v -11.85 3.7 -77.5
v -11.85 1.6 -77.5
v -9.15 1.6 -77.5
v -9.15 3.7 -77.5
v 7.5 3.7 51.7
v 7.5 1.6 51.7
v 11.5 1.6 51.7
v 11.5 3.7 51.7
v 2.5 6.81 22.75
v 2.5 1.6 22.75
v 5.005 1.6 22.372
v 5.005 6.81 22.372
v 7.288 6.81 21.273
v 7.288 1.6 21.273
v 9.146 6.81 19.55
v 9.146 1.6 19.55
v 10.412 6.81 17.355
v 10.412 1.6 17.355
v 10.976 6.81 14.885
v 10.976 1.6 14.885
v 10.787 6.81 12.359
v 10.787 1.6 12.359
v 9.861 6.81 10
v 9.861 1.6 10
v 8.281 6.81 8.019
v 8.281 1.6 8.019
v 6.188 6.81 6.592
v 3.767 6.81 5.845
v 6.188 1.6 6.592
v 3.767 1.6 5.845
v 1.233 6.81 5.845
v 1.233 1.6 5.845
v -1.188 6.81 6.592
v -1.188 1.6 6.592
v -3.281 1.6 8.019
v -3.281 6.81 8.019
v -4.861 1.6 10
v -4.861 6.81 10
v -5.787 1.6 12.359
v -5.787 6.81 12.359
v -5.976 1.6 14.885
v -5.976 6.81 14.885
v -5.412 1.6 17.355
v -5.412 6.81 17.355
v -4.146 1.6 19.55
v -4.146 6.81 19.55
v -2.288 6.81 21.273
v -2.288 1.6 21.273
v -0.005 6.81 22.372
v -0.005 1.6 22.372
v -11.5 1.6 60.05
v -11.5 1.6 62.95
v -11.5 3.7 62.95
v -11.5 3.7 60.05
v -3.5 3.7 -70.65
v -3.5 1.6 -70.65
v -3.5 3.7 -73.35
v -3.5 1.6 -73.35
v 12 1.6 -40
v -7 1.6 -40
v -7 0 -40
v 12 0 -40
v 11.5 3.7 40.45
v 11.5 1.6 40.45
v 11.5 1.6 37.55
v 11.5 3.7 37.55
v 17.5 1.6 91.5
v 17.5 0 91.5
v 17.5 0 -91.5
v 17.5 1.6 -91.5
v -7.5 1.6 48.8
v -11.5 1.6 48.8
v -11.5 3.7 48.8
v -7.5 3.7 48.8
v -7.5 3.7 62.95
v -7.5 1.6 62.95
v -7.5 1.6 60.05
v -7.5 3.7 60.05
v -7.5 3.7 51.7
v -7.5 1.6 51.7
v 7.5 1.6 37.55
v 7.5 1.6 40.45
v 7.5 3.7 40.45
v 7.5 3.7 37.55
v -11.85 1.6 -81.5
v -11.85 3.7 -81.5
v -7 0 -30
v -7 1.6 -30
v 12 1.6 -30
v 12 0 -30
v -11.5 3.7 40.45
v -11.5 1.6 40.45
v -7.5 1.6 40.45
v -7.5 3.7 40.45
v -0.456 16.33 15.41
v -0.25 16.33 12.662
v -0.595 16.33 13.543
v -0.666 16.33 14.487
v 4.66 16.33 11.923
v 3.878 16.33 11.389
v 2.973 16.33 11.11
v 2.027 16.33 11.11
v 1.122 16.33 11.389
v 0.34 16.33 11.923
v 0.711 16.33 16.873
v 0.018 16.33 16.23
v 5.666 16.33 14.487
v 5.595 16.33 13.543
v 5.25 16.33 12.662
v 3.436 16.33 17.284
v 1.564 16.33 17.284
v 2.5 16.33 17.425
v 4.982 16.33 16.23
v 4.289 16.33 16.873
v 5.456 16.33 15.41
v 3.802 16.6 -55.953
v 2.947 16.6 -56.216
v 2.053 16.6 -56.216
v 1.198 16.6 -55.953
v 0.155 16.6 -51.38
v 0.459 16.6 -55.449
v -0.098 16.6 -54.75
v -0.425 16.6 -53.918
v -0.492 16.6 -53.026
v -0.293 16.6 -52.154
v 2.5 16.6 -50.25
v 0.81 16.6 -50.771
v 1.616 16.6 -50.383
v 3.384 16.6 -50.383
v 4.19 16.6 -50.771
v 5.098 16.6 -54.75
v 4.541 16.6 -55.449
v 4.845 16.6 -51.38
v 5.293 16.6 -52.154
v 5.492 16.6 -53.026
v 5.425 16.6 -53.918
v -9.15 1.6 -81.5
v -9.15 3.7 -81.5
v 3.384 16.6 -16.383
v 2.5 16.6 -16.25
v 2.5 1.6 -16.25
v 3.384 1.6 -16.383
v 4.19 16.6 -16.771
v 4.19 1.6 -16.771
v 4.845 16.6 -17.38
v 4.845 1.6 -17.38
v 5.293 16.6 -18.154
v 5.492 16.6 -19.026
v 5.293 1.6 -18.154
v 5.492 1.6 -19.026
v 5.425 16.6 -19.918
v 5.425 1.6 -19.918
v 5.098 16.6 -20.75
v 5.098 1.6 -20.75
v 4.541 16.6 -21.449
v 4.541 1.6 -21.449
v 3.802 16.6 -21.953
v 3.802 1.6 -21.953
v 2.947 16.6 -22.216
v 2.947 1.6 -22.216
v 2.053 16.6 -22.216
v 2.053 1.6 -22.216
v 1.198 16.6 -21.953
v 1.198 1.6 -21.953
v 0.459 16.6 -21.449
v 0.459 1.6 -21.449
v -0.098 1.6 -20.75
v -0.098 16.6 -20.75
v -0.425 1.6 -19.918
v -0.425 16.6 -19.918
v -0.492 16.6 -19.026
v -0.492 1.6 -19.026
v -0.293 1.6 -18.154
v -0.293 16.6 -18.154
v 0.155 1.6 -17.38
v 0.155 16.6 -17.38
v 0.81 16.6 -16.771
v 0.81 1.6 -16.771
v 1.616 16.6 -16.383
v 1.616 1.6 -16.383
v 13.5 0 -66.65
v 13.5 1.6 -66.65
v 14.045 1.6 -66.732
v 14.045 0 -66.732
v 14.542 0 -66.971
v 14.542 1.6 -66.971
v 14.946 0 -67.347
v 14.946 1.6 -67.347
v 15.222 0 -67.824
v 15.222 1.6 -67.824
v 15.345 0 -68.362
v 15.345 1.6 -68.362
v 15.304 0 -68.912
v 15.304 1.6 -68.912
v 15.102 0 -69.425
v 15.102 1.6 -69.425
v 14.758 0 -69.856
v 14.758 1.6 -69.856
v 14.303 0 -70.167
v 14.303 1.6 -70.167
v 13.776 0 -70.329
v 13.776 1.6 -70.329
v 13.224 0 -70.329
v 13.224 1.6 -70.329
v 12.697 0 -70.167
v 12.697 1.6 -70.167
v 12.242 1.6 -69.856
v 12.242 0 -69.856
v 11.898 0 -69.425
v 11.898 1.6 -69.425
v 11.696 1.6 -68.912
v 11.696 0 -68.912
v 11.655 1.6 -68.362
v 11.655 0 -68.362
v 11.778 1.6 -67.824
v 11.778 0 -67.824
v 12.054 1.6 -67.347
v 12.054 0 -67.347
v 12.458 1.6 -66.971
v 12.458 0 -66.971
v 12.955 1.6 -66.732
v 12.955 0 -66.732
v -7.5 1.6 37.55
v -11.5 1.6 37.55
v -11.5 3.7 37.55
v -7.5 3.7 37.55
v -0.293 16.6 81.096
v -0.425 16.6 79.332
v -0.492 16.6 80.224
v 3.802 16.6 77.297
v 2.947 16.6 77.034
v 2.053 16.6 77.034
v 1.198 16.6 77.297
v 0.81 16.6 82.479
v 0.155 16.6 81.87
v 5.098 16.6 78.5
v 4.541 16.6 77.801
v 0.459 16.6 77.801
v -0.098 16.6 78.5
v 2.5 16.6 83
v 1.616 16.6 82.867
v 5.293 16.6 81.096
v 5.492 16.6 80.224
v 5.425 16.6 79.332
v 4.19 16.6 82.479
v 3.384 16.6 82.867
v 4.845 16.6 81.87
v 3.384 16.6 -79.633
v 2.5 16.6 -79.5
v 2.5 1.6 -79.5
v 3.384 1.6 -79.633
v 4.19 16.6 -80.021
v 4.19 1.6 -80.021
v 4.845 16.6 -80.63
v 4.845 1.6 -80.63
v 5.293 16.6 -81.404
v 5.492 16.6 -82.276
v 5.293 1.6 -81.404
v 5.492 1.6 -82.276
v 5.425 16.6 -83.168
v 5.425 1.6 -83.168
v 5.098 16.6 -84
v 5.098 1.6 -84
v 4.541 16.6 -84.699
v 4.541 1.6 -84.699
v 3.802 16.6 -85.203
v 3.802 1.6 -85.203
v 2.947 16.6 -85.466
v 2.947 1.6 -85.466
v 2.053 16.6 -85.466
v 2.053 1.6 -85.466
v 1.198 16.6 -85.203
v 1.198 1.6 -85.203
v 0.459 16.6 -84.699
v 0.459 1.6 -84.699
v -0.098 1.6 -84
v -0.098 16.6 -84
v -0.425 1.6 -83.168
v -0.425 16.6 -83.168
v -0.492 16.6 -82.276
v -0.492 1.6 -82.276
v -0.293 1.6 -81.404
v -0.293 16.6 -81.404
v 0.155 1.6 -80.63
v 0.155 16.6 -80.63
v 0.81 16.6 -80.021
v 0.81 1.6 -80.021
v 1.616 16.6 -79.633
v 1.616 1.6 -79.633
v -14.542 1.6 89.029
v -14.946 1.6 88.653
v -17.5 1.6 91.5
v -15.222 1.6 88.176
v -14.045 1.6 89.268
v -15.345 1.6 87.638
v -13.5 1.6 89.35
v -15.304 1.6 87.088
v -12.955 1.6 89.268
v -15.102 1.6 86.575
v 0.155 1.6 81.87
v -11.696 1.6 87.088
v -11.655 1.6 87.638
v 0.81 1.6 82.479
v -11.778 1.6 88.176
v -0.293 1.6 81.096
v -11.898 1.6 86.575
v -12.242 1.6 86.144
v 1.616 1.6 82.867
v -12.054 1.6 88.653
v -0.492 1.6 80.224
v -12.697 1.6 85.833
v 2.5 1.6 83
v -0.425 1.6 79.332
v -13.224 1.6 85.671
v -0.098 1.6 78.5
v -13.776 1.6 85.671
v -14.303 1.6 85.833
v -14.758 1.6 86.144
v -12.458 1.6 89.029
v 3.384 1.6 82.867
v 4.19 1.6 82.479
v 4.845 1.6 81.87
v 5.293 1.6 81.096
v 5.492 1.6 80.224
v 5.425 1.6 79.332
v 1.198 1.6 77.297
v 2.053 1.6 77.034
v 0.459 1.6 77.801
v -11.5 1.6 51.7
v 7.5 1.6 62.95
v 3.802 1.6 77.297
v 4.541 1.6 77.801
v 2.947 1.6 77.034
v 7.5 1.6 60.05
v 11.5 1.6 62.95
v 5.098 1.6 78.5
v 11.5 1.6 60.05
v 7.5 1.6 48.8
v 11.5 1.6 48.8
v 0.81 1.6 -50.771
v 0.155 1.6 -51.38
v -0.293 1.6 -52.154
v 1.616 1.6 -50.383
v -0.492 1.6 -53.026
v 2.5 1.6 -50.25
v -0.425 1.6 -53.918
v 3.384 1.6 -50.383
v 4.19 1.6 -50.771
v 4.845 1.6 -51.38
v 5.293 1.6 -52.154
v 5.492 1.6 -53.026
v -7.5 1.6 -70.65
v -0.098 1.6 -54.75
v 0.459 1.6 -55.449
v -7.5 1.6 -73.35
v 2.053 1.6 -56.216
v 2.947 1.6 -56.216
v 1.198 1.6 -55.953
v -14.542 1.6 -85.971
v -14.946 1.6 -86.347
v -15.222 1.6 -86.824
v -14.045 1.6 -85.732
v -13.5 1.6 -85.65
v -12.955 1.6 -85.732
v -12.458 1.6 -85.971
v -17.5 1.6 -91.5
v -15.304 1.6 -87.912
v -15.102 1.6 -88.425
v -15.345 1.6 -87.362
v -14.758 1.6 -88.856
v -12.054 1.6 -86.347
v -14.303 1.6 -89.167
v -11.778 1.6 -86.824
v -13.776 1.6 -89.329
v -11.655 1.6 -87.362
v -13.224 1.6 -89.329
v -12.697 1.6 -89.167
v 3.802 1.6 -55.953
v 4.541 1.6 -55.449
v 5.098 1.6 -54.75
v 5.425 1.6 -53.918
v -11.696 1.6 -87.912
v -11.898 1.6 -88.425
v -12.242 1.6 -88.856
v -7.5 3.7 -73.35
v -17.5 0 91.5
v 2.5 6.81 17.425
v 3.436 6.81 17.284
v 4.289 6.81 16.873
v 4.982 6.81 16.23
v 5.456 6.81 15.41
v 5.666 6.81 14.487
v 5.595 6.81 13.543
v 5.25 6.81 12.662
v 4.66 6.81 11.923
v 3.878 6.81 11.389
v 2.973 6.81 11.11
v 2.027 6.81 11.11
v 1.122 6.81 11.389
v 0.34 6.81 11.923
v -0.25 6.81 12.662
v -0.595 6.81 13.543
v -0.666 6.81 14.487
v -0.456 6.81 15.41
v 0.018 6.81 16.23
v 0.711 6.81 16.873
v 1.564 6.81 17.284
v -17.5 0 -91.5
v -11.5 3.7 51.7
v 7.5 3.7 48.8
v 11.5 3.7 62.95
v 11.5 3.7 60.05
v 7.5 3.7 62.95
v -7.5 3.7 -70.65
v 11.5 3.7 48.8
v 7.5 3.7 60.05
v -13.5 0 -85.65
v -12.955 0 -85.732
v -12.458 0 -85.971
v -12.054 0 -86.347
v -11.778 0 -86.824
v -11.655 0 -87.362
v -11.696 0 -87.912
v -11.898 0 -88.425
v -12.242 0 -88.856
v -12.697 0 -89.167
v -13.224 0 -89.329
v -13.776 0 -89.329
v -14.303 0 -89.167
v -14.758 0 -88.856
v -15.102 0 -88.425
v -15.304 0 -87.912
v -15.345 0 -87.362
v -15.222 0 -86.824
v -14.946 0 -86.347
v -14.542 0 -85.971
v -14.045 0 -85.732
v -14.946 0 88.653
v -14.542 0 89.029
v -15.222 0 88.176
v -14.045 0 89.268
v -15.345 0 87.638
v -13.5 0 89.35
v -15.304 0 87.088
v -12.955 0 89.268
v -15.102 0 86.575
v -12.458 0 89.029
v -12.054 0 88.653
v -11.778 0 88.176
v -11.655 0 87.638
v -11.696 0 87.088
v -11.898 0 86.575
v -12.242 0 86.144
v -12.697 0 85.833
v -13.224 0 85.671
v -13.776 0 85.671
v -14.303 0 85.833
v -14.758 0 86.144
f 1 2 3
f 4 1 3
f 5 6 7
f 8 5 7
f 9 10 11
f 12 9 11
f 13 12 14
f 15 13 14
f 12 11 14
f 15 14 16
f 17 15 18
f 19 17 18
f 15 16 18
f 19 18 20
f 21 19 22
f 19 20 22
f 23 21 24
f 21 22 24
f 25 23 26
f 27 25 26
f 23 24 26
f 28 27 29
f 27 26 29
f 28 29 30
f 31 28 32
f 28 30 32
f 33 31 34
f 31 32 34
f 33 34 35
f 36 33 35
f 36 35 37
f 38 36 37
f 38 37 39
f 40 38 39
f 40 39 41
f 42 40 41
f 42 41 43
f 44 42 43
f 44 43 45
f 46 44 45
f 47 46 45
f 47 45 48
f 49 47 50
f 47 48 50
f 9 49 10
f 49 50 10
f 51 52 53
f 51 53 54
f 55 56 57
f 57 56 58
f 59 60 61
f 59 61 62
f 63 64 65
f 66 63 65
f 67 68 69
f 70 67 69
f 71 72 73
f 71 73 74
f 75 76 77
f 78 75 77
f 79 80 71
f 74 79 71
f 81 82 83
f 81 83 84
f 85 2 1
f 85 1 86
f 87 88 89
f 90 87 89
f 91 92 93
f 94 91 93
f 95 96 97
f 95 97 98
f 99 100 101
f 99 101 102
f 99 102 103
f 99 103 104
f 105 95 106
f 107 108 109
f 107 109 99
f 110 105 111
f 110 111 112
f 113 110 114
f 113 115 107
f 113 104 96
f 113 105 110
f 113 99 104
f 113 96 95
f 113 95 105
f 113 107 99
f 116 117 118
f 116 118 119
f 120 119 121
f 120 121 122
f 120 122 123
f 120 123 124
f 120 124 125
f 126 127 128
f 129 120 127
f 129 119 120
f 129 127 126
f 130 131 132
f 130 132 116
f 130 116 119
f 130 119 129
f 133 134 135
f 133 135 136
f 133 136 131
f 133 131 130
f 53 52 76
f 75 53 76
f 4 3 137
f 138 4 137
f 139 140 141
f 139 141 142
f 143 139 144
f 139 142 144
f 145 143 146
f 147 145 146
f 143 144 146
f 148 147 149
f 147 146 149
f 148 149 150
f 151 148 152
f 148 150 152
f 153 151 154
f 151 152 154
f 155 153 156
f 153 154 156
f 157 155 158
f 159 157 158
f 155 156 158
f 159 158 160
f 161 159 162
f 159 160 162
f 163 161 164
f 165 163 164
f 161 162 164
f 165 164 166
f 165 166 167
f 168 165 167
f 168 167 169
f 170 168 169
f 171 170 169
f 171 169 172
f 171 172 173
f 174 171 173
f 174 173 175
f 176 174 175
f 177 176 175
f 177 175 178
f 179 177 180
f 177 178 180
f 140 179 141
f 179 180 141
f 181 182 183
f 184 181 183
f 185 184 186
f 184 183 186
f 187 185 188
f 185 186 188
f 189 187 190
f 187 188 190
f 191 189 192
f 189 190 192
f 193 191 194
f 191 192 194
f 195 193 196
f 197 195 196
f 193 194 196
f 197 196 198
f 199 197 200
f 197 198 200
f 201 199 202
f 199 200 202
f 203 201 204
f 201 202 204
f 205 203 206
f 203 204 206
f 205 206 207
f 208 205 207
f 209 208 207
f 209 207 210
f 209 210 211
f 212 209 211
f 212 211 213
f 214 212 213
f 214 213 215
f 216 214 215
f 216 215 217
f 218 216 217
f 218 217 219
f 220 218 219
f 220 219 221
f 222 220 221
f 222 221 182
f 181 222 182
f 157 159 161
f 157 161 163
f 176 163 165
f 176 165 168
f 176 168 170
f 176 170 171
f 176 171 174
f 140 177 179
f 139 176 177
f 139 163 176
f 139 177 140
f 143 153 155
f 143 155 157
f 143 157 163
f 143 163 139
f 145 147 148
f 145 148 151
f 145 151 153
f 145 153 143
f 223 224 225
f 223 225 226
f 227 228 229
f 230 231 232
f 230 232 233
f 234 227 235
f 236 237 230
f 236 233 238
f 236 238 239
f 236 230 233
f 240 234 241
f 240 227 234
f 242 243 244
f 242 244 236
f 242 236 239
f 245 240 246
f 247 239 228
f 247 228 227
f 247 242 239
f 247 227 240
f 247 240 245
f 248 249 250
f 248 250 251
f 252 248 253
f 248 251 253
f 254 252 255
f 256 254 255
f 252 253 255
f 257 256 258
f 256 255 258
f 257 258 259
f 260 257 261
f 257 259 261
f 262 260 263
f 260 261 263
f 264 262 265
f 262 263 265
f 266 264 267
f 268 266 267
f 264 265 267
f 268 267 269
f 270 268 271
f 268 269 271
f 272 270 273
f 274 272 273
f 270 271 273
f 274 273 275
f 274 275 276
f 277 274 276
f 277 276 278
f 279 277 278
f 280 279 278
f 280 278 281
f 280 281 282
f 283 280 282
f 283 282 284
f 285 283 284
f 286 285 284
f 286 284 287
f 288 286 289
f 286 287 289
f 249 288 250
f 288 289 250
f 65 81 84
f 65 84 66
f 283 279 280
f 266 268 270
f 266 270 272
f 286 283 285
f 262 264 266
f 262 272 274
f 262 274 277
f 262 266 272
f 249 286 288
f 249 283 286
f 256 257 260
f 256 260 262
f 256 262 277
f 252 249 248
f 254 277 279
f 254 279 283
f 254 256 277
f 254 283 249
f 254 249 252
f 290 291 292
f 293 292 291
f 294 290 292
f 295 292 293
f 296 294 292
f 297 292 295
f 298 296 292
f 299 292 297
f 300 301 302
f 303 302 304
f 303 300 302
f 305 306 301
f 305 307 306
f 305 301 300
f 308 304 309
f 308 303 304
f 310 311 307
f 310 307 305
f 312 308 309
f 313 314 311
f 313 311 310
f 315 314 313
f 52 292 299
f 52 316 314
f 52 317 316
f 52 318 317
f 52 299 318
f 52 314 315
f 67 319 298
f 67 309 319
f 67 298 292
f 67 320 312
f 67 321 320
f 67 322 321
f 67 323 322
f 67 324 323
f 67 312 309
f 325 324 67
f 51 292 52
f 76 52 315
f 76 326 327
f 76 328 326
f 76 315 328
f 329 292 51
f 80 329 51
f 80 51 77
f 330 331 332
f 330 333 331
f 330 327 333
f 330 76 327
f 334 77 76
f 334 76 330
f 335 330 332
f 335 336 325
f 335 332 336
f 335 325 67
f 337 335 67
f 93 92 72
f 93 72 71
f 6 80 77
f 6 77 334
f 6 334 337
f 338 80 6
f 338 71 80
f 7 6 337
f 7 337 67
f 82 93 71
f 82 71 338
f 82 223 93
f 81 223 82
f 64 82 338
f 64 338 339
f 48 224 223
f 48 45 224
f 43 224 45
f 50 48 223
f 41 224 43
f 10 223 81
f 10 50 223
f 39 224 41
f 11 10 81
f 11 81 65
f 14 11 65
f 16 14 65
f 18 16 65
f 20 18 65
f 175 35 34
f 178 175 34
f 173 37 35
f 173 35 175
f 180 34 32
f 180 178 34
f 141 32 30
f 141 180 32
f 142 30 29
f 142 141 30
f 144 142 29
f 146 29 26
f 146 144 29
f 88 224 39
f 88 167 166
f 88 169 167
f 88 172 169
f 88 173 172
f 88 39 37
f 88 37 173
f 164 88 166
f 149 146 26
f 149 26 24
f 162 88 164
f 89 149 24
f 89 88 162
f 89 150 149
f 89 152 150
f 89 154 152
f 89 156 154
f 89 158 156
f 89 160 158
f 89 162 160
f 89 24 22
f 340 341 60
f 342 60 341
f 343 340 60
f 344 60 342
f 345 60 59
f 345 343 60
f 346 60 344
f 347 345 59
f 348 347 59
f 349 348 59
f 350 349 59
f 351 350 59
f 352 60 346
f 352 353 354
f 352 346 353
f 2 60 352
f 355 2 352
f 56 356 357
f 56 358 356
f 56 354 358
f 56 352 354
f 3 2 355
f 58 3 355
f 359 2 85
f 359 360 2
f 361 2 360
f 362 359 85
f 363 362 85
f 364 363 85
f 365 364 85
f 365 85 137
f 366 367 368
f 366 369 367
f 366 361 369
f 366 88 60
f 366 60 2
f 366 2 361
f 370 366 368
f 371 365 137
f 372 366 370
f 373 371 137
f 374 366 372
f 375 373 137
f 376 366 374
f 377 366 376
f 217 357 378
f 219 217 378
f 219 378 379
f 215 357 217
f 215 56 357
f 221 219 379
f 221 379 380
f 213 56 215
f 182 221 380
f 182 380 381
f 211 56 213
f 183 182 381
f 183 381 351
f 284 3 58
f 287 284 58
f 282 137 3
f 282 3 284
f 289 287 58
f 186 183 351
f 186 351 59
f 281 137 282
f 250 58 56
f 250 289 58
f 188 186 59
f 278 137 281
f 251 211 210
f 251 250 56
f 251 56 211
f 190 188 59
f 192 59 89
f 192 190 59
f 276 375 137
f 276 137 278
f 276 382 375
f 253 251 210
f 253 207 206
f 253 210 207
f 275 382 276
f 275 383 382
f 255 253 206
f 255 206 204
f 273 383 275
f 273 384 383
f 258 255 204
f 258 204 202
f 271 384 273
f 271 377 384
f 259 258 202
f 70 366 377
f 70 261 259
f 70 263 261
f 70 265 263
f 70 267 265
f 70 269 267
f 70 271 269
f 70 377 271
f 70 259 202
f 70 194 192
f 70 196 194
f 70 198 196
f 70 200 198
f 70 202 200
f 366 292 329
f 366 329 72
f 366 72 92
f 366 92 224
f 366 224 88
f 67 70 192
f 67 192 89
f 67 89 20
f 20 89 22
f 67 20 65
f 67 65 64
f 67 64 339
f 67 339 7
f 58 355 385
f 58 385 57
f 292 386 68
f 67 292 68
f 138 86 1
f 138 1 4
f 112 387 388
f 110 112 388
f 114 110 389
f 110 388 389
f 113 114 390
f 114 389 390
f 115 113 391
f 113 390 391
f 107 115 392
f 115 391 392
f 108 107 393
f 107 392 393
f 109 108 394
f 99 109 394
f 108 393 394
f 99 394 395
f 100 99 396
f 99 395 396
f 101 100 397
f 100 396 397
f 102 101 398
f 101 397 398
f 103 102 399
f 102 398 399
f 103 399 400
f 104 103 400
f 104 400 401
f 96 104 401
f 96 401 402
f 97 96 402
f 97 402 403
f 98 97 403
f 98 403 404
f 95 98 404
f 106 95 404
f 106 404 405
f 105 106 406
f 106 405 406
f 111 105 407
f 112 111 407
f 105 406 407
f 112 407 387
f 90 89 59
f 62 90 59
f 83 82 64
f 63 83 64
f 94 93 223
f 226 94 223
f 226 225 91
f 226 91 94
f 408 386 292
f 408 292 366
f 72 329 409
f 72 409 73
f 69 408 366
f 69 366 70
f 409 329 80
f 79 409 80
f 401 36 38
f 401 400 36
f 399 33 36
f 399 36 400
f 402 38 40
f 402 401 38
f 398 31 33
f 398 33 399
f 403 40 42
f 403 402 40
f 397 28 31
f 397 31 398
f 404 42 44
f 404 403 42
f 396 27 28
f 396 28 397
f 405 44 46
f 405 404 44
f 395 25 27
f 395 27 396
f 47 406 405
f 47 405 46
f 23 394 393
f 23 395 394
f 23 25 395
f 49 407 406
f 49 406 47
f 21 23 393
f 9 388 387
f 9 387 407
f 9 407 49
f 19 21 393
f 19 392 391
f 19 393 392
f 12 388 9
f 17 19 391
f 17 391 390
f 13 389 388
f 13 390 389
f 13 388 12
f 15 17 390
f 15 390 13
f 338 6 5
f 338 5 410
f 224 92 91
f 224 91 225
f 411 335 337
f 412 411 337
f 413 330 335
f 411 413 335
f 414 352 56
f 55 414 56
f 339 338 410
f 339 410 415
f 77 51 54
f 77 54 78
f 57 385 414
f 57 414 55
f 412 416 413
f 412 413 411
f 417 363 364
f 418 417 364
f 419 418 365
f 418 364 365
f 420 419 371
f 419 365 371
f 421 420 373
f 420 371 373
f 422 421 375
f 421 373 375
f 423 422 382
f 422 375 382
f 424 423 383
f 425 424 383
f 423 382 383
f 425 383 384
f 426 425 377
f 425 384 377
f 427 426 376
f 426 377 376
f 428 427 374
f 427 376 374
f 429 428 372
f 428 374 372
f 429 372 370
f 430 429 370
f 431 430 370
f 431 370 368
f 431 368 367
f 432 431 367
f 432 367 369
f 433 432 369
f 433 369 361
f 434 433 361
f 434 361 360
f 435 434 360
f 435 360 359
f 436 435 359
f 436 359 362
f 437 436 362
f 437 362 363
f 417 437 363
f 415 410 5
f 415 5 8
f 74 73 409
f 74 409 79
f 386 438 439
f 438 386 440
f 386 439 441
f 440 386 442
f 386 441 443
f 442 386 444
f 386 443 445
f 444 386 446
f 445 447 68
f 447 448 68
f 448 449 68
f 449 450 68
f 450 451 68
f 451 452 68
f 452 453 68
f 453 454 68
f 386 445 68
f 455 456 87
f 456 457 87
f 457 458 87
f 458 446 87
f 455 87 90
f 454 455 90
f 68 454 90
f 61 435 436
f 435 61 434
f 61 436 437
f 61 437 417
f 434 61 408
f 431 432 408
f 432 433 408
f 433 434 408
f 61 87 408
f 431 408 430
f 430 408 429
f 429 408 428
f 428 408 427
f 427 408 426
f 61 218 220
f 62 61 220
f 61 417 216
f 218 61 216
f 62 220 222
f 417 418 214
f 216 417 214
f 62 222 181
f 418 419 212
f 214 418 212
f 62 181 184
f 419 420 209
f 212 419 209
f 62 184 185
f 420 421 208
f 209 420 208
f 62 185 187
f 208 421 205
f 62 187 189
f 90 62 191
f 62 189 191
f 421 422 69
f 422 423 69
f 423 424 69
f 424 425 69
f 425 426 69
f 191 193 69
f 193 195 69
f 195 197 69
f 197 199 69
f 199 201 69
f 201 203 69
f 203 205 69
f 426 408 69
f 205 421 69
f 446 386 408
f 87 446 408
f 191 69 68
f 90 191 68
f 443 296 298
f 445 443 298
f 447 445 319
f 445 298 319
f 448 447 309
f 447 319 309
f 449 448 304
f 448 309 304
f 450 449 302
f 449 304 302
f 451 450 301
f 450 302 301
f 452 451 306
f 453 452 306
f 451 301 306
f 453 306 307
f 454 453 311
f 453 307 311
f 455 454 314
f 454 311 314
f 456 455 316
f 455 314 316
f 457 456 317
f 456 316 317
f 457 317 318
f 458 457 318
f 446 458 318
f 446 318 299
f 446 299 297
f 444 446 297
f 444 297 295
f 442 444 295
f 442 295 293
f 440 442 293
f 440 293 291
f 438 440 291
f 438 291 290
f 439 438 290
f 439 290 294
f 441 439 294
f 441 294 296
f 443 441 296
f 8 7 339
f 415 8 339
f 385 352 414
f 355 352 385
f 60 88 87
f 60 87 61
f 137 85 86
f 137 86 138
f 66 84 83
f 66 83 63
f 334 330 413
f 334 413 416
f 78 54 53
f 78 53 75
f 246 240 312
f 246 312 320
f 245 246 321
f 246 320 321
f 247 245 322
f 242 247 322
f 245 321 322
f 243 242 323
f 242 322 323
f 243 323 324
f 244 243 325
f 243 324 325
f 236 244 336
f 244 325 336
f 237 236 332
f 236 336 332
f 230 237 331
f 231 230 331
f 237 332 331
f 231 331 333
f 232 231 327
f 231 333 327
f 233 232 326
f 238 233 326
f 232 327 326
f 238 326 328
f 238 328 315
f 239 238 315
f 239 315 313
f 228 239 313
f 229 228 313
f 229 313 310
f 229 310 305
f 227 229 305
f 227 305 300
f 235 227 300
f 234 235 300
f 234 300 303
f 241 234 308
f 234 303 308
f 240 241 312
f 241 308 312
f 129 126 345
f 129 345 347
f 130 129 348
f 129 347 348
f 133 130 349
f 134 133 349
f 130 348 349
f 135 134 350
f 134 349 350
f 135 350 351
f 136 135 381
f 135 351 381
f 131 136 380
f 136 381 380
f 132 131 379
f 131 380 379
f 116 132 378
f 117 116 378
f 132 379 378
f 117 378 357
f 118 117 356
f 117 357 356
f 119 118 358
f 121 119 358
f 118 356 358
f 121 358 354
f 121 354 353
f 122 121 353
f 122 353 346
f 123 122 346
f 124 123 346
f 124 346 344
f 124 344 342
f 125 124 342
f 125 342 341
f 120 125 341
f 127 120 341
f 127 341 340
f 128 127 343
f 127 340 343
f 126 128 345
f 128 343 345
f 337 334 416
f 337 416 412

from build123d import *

# Parameters (mm, degrees)
PCB_W               = 35
PCB_H               = 183
BOSS_EXTRUDE1_DEPTH = 1.6
SKETCH3_R           = 3
BOSS_EXTRUDE2_DEPTH = 15
SKETCH4_R           = 8.5
BOSS_EXTRUDE3_DEPTH = 5.21
SKETCH5_R           = 3.175
BOSS_EXTRUDE4_DEPTH = 9.52
SKETCH6_W           = 4
SKETCH6_H           = 2.9
BOSS_EXTRUDE5_DEPTH = 2.1
SKETCH7_R           = 1.85
CUT_EXTRUDE2_DEPTH  = 95.35835946
SKETCH8_W           = 4
SKETCH8_H           = 2.7
SKETCH8_W_2         = 2.7
SKETCH8_H_2         = 4
BOSS_EXTRUDE6_DEPTH = 2.1
SKETCH9_W           = 19
SKETCH9_H           = 10
CUT_EXTRUDE3_DEPTH  = 95.35835946


with BuildPart() as part:
    # pcb → Boss-Extrude1 (new body)
    with BuildSketch(Plane(origin=(0, 0, 0), x_dir=(1, 0, 0), z_dir=(0, 1, 0))):
        Rectangle(PCB_W, PCB_H)
    extrude(amount=BOSS_EXTRUDE1_DEPTH)

    # Sketch3 → Boss-Extrude2 (add)
    with BuildSketch(Plane(origin=(0, 1.6, 0), x_dir=(1, 0, 0), z_dir=(0, 1, 0))):
        with Locations(Location((2.5, 82.5, 0), (0, 0, 270))):
            Circle(SKETCH3_R)
        with Locations(Location((2.5, 53.25, 0), (0, 0, 270))):
            Circle(SKETCH3_R)
        with Locations(Location((2.5, 19.25, 0), (0, 0, 270))):
            Circle(SKETCH3_R)
        with Locations(Location((2.5, -80, 0), (0, 0, 270))):
            Circle(SKETCH3_R)
    extrude(amount=BOSS_EXTRUDE2_DEPTH)

    # Sketch4 → Boss-Extrude3 (add)
    with BuildSketch(Plane(origin=(0, 1.6, 0), x_dir=(1, 0, 0), z_dir=(0, 1, 0))):
        with Locations(Location((2.5, -14.25, 0), (0, 0, 270))):
            Circle(SKETCH4_R)
    extrude(amount=BOSS_EXTRUDE3_DEPTH)

    # Sketch5 → Boss-Extrude4 (add)
    with BuildSketch(Plane(origin=(0, 6.81, 0), x_dir=(1, 0, 0), z_dir=(0, 1, 0))):
        with Locations(Location((2.5, -14.25, 0), (0, 0, 270))):
            Circle(SKETCH5_R)
    extrude(amount=BOSS_EXTRUDE4_DEPTH)

    # Sketch6 → Boss-Extrude5 (add)
    with BuildSketch(Plane(origin=(0, 1.6, 0), x_dir=(1, 0, 0), z_dir=(0, 1, 0))):
        with Locations((-9.5, -39)):
            Rectangle(SKETCH6_W, SKETCH6_H)
        with Locations((9.5, -39)):
            Rectangle(SKETCH6_W, SKETCH6_H)
        with Locations((-9.5, -50.25)):
            Rectangle(SKETCH6_W, SKETCH6_H)
        with Locations((9.5, -50.25)):
            Rectangle(SKETCH6_W, SKETCH6_H)
        with Locations((-9.5, -61.5)):
            Rectangle(SKETCH6_W, SKETCH6_H)
        with Locations((9.5, -61.5)):
            Rectangle(SKETCH6_W, SKETCH6_H)
    extrude(amount=BOSS_EXTRUDE5_DEPTH)

    # Sketch7 → Cut-Extrude2 (cut, through all)
    with BuildSketch(Plane(origin=(0, 1.6, 0), x_dir=(1, 0, 0), z_dir=(0, 1, 0))):
        with Locations(Location((13.5, 68.5, 0), (0, 0, 270))):
            Circle(SKETCH7_R)
        with Locations(Location((-13.5, 87.5, 0), (0, 0, 270))):
            Circle(SKETCH7_R)
        with Locations(Location((-13.5, -87.5, 0), (0, 0, 270))):
            Circle(SKETCH7_R)
    extrude(amount=-CUT_EXTRUDE2_DEPTH, mode=Mode.SUBTRACT)

    # Sketch8 → Boss-Extrude6 (add)
    with BuildSketch(Plane(origin=(0, 1.6, 0), x_dir=(1, 0, 0), z_dir=(0, 1, 0))):
        with Locations((-5.5, 72)):
            Rectangle(SKETCH8_W, SKETCH8_H)
        with Locations((-10.5, 79.5)):
            Rectangle(SKETCH8_W_2, SKETCH8_H_2)
    extrude(amount=BOSS_EXTRUDE6_DEPTH)

    # Sketch9 → Cut-Extrude3 (cut, through all)
    with BuildSketch(Plane(origin=(0, 1.6, 0), x_dir=(1, 0, 0), z_dir=(0, 1, 0))):
        with Locations((2.5, 35)):
            Rectangle(SKETCH9_W, SKETCH9_H)
    extrude(amount=-CUT_EXTRUDE3_DEPTH, mode=Mode.SUBTRACT)


solid = part.part
